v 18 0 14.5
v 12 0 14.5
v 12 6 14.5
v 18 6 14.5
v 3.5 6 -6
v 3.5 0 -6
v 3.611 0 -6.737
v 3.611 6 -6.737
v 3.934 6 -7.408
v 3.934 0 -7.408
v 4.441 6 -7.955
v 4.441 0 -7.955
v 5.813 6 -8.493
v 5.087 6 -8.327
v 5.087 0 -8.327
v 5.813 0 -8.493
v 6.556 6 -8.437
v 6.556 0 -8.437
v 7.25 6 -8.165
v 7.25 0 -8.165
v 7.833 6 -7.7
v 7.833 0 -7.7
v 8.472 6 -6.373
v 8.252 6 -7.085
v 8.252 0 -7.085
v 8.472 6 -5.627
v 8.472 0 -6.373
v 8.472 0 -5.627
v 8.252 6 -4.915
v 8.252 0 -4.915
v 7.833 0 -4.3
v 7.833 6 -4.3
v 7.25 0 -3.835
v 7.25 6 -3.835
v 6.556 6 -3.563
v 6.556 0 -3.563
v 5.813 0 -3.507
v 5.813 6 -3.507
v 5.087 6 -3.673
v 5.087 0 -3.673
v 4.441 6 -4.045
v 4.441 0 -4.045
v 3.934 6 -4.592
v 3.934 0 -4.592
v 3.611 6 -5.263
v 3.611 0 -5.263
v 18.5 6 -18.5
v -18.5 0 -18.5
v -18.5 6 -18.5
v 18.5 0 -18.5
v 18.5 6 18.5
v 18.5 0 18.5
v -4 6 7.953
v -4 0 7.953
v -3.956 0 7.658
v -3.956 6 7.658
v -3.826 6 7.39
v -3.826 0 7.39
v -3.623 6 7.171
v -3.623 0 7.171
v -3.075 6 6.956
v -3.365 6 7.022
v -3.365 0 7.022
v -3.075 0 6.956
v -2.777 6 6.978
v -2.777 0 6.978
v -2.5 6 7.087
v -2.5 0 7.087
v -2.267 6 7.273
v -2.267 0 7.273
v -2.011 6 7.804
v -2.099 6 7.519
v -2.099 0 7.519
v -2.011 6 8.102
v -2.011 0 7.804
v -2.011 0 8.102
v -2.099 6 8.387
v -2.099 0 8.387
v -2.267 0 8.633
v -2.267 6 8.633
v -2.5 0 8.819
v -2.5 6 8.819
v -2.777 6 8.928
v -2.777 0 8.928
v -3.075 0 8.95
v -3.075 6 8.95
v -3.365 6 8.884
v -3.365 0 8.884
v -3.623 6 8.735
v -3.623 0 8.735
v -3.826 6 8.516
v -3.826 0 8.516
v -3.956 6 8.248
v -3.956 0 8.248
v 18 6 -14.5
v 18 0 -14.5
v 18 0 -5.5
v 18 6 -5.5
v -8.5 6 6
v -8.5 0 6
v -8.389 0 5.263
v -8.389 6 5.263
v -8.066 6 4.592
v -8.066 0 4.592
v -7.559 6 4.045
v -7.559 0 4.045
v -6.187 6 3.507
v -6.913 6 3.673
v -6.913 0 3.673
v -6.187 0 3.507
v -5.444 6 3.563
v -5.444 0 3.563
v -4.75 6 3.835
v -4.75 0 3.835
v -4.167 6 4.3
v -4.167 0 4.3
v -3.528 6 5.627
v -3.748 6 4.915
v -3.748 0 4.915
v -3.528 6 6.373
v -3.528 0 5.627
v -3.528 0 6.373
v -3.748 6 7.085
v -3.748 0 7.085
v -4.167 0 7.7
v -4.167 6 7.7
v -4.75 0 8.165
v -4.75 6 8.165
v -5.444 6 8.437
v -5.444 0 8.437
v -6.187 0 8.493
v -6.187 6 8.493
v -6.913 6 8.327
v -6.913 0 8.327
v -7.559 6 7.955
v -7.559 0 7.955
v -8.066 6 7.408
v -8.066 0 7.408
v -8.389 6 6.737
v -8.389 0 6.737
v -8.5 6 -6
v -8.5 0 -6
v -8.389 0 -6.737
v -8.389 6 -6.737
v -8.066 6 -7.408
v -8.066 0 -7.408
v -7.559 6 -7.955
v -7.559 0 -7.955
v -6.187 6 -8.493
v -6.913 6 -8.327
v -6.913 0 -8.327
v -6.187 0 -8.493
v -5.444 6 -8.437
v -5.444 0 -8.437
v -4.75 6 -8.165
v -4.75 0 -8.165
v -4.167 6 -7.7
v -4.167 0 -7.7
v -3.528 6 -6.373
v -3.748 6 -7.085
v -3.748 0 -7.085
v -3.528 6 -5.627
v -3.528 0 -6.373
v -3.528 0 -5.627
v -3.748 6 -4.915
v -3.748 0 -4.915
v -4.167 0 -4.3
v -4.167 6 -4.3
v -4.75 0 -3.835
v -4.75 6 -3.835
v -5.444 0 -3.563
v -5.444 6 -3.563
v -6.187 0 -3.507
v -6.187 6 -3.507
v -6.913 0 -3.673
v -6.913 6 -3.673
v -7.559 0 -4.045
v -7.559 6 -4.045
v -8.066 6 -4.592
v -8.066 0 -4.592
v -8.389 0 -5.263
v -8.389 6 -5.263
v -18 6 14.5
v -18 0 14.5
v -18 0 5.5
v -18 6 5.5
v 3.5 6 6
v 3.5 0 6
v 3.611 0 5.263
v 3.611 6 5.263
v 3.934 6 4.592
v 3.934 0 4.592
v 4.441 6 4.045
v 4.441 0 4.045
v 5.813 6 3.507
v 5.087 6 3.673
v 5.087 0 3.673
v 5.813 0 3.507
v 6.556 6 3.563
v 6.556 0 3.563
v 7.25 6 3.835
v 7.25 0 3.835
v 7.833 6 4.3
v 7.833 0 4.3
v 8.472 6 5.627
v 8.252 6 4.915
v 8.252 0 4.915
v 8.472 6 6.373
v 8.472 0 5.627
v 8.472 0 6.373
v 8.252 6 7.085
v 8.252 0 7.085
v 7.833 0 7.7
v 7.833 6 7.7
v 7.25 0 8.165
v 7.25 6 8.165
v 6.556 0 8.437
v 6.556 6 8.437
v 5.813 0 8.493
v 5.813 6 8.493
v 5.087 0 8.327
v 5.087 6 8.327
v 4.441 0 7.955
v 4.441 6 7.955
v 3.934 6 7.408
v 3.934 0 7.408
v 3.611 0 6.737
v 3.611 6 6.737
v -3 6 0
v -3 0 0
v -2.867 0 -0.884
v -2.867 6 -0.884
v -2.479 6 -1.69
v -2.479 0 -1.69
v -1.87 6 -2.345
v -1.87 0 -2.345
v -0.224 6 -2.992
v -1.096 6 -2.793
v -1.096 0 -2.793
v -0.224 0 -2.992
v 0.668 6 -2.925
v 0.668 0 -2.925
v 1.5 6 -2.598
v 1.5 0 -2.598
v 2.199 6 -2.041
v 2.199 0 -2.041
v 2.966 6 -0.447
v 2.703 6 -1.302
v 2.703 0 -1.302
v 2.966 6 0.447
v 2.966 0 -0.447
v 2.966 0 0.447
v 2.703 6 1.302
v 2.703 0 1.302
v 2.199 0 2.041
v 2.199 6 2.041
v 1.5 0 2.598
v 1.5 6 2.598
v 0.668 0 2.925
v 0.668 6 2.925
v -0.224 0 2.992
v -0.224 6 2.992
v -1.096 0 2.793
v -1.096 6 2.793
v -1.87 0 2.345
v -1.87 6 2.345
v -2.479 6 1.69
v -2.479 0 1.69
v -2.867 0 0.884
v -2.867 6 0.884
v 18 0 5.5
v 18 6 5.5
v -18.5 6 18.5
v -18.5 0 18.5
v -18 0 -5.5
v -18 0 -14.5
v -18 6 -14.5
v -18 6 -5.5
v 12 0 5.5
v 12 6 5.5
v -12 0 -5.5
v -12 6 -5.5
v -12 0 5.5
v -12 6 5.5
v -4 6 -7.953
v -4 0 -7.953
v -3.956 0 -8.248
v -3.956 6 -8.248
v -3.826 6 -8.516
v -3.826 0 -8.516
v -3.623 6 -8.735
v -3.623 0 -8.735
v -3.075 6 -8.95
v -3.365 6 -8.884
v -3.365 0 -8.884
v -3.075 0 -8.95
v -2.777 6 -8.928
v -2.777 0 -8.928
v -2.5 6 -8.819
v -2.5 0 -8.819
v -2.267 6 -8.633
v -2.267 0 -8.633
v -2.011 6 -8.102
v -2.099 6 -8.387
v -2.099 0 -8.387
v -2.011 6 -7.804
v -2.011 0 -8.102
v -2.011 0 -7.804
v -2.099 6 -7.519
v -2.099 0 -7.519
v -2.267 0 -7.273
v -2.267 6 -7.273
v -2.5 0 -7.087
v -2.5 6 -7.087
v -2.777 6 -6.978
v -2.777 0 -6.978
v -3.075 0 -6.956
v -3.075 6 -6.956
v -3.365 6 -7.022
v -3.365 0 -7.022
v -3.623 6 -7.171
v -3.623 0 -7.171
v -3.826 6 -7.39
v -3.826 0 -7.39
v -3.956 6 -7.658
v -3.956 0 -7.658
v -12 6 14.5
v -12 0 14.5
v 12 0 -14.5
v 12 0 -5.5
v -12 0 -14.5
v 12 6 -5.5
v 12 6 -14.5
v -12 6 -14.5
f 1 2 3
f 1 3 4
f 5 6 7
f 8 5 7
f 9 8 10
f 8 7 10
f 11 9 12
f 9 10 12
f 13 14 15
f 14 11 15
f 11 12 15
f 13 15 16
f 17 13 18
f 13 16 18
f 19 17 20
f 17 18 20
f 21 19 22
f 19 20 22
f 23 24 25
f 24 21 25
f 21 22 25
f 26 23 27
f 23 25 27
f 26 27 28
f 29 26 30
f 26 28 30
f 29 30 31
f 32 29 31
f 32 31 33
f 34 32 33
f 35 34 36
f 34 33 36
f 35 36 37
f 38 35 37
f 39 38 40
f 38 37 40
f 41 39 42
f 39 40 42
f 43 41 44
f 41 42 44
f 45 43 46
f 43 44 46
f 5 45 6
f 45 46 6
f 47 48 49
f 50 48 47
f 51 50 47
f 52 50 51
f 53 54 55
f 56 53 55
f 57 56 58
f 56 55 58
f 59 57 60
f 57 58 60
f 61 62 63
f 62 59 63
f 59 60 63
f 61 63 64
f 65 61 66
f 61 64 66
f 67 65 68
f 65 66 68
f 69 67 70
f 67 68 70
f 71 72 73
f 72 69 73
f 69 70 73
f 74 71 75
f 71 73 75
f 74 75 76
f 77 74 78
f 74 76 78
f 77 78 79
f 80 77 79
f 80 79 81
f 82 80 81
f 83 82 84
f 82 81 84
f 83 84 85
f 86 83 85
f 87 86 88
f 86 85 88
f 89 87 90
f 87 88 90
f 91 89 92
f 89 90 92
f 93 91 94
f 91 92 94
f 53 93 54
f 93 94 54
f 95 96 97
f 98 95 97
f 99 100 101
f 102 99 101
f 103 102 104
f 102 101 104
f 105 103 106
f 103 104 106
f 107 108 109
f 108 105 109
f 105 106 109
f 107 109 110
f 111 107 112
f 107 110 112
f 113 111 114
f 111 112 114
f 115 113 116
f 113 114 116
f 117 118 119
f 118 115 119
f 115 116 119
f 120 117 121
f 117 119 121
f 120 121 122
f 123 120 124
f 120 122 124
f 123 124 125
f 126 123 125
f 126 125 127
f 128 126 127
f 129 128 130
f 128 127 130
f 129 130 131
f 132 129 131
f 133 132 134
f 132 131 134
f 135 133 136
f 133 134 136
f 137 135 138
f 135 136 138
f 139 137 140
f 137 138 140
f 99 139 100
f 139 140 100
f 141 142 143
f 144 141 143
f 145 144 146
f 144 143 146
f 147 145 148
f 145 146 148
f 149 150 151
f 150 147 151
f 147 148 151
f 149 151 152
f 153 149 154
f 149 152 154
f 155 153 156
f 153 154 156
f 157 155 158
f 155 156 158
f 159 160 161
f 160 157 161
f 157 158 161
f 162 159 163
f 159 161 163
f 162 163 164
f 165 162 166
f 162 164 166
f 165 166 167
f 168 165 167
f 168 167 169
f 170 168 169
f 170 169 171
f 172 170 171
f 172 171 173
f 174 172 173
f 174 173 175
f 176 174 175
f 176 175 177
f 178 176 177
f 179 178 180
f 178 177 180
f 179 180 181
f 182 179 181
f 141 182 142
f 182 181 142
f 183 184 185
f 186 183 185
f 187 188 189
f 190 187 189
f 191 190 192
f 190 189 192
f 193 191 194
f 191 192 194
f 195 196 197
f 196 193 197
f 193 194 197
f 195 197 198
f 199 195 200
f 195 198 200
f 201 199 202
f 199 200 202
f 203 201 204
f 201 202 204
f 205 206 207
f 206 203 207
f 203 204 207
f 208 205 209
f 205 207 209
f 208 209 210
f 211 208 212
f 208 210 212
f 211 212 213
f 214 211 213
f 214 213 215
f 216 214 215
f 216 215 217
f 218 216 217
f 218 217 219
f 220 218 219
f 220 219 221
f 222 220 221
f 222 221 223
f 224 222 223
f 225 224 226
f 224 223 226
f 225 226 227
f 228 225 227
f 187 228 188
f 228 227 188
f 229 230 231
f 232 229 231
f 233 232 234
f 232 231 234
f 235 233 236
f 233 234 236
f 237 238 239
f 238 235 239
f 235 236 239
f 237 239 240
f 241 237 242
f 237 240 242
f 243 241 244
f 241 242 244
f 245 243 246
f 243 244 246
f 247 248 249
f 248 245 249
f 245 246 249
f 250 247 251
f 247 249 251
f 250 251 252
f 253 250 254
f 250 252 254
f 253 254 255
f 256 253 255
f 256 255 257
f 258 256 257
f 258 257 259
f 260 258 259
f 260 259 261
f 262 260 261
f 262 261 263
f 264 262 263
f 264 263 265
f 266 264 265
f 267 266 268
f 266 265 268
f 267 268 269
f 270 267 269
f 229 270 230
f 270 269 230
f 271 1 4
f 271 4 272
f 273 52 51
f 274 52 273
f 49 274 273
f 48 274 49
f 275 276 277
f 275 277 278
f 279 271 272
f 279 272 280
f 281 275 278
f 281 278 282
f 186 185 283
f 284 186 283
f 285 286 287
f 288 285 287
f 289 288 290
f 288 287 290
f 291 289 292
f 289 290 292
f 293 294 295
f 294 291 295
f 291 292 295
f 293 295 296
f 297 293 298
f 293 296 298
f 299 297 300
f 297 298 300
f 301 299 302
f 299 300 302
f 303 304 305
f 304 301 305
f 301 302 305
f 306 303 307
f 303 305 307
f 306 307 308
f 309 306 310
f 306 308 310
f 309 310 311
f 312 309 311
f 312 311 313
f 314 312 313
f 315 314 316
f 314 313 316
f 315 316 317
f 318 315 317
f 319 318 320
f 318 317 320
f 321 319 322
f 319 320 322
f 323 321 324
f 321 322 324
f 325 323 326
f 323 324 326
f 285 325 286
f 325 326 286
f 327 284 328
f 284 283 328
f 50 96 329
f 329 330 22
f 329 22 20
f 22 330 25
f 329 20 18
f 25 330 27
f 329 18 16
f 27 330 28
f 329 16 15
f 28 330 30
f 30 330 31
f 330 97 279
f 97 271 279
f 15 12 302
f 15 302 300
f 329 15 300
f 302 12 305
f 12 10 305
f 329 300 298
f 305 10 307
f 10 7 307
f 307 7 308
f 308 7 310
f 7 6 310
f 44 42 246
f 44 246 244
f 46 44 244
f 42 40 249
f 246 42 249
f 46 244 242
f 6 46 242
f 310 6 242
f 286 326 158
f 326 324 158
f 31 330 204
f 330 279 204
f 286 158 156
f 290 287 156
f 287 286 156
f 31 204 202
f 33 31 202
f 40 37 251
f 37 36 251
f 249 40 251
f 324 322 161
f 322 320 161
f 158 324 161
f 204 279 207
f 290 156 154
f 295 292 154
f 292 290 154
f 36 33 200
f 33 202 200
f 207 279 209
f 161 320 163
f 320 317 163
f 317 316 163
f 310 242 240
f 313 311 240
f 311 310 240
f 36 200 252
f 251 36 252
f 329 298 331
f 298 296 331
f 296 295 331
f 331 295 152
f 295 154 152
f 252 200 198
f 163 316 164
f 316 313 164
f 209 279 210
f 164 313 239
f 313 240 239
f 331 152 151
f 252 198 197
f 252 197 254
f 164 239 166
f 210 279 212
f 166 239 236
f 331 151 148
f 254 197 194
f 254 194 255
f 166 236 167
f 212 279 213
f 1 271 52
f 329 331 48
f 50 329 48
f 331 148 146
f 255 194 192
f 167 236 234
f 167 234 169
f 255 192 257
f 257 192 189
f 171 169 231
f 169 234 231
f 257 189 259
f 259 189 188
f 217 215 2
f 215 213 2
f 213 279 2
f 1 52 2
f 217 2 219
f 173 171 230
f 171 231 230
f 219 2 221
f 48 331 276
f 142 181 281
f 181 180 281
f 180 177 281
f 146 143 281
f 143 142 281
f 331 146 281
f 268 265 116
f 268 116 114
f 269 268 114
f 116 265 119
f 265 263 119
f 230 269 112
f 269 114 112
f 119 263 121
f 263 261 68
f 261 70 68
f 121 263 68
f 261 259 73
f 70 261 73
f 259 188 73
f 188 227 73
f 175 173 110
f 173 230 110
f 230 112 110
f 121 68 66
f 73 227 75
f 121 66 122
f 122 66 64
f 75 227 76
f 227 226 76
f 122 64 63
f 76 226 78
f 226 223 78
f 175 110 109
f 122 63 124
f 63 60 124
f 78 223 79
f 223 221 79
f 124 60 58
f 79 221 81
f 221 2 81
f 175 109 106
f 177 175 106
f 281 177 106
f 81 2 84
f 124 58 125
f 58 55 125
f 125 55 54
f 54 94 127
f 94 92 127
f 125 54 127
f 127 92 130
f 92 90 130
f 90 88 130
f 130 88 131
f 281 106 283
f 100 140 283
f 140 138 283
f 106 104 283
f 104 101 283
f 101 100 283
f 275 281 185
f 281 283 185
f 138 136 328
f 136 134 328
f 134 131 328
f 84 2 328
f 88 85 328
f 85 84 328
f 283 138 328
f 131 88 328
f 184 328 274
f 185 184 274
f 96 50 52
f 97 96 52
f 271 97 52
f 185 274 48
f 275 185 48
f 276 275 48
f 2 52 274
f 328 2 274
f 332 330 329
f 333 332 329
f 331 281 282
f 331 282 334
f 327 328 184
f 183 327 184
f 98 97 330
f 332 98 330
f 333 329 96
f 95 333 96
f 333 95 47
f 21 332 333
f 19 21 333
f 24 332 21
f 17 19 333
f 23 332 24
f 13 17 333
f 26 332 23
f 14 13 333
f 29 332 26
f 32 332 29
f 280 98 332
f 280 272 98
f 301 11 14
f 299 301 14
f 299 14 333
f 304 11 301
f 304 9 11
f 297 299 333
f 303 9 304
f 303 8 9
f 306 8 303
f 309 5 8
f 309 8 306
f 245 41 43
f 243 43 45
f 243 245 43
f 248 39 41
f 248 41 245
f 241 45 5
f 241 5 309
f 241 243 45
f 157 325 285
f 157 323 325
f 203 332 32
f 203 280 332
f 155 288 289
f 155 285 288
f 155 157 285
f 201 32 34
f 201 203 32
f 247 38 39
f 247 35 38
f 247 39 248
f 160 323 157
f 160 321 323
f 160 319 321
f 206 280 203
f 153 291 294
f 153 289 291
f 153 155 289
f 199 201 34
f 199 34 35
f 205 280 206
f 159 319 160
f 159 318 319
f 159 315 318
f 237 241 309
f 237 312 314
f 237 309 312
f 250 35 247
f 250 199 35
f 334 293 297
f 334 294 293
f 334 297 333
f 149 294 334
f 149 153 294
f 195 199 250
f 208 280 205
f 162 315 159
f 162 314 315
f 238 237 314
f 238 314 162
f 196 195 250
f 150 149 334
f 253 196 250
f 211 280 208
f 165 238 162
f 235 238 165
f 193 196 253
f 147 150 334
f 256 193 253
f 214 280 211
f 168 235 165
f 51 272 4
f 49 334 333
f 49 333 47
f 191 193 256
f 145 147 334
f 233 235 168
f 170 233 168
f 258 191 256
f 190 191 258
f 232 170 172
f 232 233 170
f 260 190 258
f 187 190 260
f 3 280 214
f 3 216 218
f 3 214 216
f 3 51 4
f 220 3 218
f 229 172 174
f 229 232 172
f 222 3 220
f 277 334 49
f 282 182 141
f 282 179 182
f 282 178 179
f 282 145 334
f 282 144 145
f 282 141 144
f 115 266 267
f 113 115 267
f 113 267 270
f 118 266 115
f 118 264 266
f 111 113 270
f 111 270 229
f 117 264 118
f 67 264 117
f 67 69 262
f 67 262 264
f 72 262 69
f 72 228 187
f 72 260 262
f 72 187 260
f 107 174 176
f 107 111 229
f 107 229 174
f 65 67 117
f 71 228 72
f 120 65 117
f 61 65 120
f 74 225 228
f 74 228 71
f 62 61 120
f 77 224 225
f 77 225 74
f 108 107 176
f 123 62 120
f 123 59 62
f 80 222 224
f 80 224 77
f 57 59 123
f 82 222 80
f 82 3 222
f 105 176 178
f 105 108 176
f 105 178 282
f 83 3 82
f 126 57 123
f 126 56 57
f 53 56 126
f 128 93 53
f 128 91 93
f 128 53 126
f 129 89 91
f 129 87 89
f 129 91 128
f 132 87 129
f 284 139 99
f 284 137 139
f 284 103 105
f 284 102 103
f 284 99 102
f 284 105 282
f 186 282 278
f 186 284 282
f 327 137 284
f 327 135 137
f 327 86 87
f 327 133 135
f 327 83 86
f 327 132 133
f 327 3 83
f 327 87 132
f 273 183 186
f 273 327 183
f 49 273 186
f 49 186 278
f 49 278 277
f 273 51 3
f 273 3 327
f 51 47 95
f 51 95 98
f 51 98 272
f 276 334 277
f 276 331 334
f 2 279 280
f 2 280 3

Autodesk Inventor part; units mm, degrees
ref_plane "YZ Plane" through (0, 0, 0) normal (1, 0, 0) x (0, 1, 0)
ref_plane "XZ Plane" through (0, 0, 0) normal (0, 1, 0) x (-1, 0, 0)
ref_plane "XY Plane" through (0, 0, 0) normal (0, 0, 1) x (1, 0, 0)
sketch "Sketch2" plane through (0, 0, 0) normal (0, 1, 0) x (-1, 0, 0)
  line L0 (-18.5, 18.5) -> (18.5, 18.5)
  line L1 (18.5, 18.5) -> (18.5, -18.5)
  line L2 (18.5, -18.5) -> (-18.5, -18.5)
  line L3 (-18.5, -18.5) -> (-18.5, 18.5)
  line L4 (-18.5, 18.5) -> (18.5, -18.5) construction
  line L5 (18.5, 18.5) -> (-18.5, -18.5) construction
  line L6 (12, -14.5) -> (18, -14.5)
  line L7 (18, -14.5) -> (18, -5.5)
  line L8 (18, -5.5) -> (12, -5.5)
  line L9 (12, -5.5) -> (12, -14.5)
  line L10 (12, -14.5) -> (18, -5.5) construction
  line L11 (18, -14.5) -> (12, -5.5) construction
  line L12 (0, 18.5) -> (0, -18.5) construction
  line L13 (18.5, 0) -> (-18.5, 0) construction
  circle A0 centre (0, 0) radius 3
  circle A1 centre (6, -6) radius 2.5
  circle A2 centre (-6, 6) radius 2.5
  circle A3 centre (3, -7.953) radius 1
  line L14 (12, 14.5) -> (18, 14.5)
  line L15 (18, 14.5) -> (18, 5.5)
  line L16 (18, 5.5) -> (12, 5.5)
  line L17 (12, 5.5) -> (12, 14.5)
  line L18 (12, 14.5) -> (18, 5.5) construction
  line L19 (18, 14.5) -> (12, 5.5) construction
  line L20 (-12, -14.5) -> (-18, -14.5)
  line L21 (-18, -14.5) -> (-18, -5.5)
  line L22 (-18, -5.5) -> (-12, -5.5)
  line L23 (-12, -5.5) -> (-12, -14.5)
  line L24 (-12, -14.5) -> (-18, -5.5) construction
  line L25 (-18, -14.5) -> (-12, -5.5) construction
  line L26 (-12, 5.5) -> (-12, 14.5)
  line L27 (-12, 14.5) -> (-18, 14.5)
  line L28 (-18, 14.5) -> (-18, 5.5)
  line L29 (-12, 14.5) -> (-18, 5.5) construction
  line L30 (-18, 14.5) -> (-12, 5.5) construction
  line L31 (-18, 5.5) -> (-12, 5.5)
  circle A4 centre (6, 6) radius 2.5
  circle A5 centre (-6, -6) radius 2.5
  circle A6 centre (3, 7.953) radius 1
  point P0 (15, -10)
  point P1 (15, 10)
  point P2 (-15, -10)
  point P3 (-15, 10)
  dimension "d0" = 37
  dimension "d1" = 37
  dimension "d3" = 9
  dimension "d5" = 6
  dimension "d8" = 5
  dimension "d10" = 6
  dimension "d11" = 6
  dimension "d23" = 2
  dimension "d27" = 6
  dimension "d30" = 15
  dimension "d32" = 14.5
  dimension "d33" = 9
  dimension "d35" = 8.5
extrude "Extrusion1" add sketch "Sketch2" along normal blind 6
equation "\"d0\" = d1"
equation "\"d11\" = d10"
properties part number "thumper-base-v3"
